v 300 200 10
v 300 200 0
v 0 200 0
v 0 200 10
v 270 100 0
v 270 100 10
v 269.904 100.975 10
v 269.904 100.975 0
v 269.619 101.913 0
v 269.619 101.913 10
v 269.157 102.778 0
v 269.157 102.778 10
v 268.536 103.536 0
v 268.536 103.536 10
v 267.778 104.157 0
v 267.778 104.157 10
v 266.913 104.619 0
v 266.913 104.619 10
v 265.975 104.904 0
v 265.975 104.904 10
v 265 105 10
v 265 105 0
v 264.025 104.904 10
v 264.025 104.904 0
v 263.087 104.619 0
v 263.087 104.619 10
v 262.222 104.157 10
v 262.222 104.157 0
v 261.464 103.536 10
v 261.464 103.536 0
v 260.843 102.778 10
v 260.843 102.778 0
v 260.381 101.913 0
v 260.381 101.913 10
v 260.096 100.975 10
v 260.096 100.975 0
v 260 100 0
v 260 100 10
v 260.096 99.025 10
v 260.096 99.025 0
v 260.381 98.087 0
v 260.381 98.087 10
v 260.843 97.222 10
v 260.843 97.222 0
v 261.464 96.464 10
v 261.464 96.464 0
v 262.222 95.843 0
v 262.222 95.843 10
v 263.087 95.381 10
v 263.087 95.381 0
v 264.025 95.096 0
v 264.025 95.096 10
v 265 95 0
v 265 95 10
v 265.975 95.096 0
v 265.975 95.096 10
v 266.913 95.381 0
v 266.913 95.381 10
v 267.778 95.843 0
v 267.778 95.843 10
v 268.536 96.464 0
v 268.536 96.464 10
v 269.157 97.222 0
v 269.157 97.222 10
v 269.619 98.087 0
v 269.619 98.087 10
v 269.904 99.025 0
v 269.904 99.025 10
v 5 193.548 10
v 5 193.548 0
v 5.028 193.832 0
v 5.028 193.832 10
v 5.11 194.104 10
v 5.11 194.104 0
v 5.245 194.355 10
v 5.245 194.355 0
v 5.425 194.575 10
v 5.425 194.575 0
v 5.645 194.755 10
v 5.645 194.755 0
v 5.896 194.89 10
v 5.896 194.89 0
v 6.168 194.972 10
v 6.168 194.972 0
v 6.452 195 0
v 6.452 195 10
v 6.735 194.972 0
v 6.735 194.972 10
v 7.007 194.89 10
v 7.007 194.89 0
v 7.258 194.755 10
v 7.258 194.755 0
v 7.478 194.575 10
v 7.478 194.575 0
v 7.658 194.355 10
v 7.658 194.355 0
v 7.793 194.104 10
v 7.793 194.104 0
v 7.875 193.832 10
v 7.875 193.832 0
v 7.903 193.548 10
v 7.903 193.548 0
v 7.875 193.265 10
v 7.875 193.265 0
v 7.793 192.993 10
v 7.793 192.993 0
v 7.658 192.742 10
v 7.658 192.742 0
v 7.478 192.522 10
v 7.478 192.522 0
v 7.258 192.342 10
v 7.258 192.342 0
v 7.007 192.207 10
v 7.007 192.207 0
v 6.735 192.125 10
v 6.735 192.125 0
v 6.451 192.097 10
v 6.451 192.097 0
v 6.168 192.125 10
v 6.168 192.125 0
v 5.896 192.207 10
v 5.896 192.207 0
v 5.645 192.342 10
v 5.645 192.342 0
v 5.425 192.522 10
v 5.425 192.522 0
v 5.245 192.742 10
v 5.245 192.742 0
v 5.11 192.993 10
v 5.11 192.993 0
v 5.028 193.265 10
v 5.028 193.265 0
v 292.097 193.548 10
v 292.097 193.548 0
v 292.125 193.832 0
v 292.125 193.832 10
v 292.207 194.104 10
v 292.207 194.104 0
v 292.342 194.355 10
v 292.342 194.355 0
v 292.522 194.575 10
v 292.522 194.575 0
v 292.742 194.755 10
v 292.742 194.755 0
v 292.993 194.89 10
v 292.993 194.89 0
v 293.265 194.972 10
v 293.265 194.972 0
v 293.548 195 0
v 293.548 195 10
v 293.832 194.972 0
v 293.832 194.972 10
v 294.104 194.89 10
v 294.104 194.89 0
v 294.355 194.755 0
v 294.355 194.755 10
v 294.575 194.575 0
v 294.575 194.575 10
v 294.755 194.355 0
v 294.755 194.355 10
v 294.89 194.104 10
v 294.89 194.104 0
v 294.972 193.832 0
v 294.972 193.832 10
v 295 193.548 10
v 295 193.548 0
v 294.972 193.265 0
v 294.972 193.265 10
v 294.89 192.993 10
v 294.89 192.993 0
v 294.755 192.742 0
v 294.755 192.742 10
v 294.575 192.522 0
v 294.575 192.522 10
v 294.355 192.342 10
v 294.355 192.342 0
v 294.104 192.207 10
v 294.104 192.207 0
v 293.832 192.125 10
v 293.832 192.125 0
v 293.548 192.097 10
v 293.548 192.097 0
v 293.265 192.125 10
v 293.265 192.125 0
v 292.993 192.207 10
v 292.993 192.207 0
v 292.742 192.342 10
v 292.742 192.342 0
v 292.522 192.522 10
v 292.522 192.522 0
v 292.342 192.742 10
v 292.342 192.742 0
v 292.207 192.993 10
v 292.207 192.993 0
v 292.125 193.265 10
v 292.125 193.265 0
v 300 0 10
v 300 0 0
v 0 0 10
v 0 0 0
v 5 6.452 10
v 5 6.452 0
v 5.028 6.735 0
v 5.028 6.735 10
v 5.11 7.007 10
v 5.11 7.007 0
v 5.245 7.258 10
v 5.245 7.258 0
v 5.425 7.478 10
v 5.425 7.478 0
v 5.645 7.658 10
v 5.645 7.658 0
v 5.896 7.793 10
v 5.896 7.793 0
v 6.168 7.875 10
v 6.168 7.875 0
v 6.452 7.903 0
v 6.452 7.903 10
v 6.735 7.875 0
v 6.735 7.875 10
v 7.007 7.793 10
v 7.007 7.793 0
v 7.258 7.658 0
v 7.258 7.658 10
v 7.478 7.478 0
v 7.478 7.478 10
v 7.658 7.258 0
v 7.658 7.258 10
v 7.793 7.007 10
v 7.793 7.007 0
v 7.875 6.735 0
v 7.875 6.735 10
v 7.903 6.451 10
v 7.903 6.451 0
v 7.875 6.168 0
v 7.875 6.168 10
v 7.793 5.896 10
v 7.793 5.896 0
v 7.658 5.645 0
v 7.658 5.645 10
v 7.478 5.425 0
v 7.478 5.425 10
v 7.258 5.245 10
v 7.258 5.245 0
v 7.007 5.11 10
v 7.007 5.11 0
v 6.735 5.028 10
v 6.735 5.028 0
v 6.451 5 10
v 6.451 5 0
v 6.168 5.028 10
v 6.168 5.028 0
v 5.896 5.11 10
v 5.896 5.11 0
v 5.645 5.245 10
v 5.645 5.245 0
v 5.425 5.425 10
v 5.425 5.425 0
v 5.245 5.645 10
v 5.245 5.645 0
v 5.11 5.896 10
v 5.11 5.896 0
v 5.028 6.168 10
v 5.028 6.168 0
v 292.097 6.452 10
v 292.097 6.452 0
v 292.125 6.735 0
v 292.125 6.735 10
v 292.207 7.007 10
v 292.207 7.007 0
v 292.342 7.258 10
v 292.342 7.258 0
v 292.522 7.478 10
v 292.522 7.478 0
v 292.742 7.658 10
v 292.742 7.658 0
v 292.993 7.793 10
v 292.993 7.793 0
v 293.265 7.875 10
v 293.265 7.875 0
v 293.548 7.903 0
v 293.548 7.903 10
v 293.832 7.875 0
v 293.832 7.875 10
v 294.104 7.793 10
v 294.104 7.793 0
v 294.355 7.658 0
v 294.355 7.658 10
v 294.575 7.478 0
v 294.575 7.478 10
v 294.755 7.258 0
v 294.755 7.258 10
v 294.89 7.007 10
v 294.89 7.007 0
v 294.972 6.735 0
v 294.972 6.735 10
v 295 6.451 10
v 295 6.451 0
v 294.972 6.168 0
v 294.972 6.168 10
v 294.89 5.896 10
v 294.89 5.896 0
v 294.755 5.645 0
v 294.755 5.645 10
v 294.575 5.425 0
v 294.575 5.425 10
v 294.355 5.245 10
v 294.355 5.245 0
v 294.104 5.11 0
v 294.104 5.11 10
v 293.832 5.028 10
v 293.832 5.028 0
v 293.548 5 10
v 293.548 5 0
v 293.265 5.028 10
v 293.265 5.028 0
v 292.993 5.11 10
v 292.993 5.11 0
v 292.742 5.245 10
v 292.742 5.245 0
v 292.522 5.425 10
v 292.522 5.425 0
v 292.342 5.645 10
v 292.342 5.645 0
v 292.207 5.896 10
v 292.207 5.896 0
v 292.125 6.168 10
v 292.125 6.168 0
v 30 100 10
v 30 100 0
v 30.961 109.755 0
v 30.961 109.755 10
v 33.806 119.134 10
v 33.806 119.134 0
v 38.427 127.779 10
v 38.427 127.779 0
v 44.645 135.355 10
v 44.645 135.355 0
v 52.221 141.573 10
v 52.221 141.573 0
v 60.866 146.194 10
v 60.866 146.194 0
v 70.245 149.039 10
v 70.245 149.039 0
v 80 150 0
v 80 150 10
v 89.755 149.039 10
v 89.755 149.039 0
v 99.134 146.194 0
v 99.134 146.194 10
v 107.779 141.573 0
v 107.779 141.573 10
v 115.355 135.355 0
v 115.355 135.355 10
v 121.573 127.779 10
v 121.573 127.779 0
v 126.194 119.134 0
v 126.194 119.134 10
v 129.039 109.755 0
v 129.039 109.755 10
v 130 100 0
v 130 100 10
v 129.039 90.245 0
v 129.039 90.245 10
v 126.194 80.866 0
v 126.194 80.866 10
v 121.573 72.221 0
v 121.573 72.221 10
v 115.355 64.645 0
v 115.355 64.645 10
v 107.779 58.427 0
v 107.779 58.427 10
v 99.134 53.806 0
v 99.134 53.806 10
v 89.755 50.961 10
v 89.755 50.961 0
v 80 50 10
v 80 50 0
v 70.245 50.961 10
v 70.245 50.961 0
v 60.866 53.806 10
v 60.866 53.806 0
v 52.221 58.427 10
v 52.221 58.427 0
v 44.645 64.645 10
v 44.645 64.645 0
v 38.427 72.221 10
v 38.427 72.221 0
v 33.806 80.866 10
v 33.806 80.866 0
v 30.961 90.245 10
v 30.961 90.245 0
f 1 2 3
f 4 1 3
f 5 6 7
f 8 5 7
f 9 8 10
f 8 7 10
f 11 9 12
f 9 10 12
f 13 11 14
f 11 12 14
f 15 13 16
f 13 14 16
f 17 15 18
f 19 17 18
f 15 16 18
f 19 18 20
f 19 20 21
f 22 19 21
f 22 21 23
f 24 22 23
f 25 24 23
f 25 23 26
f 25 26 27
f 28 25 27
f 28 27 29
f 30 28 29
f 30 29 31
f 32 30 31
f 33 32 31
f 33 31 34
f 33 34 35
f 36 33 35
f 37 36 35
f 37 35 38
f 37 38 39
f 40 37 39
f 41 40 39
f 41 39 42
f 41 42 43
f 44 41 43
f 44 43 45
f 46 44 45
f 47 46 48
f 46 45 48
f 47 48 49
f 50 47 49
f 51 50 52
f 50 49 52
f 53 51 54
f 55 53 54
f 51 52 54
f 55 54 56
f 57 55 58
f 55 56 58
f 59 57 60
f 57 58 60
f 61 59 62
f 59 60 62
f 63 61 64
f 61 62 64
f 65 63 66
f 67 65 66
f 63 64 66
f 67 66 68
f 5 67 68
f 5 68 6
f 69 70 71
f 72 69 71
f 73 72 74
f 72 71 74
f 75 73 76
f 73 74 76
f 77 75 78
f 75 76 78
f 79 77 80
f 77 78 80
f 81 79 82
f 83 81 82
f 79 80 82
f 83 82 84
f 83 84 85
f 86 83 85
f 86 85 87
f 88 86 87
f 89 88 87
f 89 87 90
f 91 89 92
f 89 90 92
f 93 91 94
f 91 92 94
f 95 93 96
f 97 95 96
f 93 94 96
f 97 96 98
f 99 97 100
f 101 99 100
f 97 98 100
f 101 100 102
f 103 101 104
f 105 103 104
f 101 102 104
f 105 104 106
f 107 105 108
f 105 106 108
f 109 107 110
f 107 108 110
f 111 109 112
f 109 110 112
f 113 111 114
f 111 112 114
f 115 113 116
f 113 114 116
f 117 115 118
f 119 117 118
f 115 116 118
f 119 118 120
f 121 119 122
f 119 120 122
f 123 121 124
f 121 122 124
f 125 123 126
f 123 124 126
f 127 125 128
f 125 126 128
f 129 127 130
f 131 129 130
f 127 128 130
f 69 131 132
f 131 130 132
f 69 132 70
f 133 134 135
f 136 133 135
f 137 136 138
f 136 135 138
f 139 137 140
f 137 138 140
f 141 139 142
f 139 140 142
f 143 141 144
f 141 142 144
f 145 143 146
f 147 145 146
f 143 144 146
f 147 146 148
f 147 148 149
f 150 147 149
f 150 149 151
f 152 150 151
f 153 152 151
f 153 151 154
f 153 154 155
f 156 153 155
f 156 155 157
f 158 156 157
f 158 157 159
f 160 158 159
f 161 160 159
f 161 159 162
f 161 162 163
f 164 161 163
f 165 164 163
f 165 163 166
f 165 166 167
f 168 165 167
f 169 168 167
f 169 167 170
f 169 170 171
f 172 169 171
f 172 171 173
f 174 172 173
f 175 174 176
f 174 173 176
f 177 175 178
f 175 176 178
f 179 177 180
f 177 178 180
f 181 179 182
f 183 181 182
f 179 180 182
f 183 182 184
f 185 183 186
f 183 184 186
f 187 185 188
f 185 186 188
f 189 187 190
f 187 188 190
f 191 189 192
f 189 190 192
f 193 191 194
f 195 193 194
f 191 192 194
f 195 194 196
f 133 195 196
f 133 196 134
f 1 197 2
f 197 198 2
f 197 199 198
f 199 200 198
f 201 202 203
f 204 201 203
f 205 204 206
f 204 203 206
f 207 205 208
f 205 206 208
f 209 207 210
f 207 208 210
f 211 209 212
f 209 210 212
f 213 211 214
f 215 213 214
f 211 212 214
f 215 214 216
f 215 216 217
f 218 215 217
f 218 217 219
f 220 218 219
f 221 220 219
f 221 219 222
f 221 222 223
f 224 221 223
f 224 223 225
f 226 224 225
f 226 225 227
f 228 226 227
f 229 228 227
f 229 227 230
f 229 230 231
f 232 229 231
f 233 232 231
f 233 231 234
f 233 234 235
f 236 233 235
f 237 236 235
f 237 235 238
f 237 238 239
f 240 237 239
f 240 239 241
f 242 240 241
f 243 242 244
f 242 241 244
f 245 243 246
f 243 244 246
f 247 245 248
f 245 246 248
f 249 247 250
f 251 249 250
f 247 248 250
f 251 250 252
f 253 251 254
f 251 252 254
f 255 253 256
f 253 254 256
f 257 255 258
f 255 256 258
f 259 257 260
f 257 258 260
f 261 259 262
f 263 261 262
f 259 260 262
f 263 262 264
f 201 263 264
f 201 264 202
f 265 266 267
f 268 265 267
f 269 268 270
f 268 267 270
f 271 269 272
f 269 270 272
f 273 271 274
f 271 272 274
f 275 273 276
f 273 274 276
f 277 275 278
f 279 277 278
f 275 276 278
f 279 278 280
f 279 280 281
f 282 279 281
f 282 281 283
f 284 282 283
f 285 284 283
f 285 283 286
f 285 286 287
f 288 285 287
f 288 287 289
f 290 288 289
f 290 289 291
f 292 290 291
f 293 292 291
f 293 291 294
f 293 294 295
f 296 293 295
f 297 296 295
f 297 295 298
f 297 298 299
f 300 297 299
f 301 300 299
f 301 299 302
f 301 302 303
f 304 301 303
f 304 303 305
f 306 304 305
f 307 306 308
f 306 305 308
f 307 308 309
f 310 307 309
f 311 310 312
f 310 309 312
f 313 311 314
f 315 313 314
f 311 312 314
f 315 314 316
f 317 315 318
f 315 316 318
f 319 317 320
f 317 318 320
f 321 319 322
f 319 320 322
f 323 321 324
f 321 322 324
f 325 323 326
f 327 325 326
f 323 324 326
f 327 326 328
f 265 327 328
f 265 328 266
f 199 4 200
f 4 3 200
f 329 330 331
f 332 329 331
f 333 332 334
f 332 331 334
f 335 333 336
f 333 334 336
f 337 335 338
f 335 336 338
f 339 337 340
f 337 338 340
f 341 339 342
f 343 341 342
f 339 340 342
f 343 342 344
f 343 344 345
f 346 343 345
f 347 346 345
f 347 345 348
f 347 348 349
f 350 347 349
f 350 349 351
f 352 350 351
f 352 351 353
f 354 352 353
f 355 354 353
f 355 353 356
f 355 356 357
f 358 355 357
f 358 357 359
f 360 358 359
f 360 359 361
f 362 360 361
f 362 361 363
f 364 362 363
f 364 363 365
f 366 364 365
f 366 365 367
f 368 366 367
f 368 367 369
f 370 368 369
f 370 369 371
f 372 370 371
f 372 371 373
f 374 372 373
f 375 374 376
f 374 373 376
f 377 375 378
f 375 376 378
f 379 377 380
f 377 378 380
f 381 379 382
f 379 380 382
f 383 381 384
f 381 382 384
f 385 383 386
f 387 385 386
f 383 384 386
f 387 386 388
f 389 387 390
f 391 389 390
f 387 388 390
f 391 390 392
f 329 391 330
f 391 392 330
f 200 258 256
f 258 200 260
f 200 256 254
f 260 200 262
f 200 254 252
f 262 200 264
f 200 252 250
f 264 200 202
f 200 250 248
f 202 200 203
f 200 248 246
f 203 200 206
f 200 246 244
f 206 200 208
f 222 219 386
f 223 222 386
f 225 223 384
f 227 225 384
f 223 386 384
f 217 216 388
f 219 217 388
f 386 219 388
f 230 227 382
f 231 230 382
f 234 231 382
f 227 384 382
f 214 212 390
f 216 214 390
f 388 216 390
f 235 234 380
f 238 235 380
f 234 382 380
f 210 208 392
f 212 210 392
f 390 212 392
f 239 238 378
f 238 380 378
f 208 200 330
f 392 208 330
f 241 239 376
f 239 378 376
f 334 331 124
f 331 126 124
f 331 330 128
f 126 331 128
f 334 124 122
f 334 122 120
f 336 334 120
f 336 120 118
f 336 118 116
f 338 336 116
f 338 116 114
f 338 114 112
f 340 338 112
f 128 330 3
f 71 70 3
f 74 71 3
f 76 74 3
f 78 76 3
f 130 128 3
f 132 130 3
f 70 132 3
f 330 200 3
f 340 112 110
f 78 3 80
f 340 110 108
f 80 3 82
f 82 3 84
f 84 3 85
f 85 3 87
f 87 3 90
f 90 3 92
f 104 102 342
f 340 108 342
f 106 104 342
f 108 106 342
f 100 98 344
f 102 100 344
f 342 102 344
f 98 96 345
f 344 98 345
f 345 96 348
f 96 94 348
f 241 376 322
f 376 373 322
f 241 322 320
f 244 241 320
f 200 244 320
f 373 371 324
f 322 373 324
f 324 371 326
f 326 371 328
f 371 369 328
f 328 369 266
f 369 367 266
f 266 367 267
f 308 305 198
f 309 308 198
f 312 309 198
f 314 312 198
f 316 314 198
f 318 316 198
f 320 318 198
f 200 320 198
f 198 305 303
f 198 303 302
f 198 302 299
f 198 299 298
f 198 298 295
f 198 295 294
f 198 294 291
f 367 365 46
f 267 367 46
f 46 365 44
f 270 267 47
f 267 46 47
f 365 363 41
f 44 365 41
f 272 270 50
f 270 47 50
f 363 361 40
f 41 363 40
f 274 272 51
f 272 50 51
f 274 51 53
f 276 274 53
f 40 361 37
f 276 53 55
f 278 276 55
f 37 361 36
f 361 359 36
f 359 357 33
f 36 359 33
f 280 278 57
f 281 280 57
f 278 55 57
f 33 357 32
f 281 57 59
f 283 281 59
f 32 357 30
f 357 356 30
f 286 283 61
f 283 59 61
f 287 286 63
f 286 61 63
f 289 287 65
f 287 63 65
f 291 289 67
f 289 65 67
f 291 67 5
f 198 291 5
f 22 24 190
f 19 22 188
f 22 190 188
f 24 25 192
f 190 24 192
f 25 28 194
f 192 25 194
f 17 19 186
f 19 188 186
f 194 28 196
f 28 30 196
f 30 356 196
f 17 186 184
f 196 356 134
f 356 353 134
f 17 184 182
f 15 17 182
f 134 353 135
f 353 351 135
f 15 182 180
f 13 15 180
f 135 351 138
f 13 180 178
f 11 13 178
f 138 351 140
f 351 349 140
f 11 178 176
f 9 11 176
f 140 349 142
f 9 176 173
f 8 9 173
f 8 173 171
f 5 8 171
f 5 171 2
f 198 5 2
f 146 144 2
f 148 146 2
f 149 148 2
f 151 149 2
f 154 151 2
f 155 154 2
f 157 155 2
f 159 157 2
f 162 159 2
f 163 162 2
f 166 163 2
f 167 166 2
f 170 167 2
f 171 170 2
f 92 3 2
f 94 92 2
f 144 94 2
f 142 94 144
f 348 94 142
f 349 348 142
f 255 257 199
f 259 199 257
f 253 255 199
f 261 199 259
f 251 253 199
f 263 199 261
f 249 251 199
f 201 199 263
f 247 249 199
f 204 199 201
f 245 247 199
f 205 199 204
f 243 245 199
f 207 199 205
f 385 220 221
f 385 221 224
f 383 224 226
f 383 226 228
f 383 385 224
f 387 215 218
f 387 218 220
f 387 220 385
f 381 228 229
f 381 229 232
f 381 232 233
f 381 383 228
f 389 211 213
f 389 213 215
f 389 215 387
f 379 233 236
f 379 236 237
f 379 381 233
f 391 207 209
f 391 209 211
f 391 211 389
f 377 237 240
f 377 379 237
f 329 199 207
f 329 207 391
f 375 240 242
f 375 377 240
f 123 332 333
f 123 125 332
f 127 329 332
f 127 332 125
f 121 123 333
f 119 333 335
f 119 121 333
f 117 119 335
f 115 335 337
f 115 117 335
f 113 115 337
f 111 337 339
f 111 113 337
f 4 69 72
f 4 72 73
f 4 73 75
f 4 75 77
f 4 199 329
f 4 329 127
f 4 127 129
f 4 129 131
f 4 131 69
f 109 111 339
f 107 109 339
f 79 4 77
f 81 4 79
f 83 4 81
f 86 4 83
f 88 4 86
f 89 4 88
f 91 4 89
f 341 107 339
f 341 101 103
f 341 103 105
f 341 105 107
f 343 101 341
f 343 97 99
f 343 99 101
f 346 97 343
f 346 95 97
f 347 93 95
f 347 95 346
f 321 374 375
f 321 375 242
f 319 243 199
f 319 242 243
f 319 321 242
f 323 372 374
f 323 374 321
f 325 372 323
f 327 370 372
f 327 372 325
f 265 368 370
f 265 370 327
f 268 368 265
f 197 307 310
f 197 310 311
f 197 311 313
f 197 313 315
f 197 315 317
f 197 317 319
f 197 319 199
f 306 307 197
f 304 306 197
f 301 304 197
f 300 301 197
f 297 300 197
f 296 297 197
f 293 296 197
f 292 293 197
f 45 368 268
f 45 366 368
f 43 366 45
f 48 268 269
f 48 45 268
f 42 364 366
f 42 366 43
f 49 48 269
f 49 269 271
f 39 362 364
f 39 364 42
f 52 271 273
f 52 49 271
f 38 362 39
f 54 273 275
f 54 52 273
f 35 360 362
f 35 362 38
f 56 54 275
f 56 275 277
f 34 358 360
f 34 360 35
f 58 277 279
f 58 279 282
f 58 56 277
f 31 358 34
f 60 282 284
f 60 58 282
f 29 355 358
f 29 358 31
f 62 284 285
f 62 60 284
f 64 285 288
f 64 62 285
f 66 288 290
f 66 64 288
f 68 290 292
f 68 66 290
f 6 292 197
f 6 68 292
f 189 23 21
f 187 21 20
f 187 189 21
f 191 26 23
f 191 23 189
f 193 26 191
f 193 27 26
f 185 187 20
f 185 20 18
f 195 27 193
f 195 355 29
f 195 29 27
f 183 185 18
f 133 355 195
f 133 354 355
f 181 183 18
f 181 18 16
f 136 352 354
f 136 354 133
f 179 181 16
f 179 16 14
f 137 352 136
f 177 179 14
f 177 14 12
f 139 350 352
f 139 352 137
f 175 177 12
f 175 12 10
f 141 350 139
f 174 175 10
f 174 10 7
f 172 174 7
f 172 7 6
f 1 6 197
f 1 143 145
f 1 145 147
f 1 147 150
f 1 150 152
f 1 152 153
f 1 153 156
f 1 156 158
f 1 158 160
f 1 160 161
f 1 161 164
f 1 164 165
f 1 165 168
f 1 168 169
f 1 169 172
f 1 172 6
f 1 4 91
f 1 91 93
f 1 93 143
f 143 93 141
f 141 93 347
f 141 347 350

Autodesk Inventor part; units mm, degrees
ref_plane "YZ Plane" through (0, 0, 0) normal (1, 0, 0) x (0, 1, 0)
ref_plane "XZ Plane" through (0, 0, 0) normal (0, 1, 0) x (-1, 0, 0)
ref_plane "XY Plane" through (0, 0, 0) normal (0, 0, 1) x (1, 0, 0)
sketch "Sketch1" plane through (0, 0, 0) normal (0, 0, 1) x (1, 0, 0)
  line L0 (0, 0) -> (300, 0)
  line L1 (300, 0) -> (300, 200)
  line L2 (300, 200) -> (0, 200)
  line L3 (0, 200) -> (0, 0)
  dimension "d0" = 300
  dimension "d1" = 200
extrude "Extrusion1" add sketch "Sketch1" along normal blind 10
sketch "Sketch2" plane through (0, 0, 0) normal (0, 0, -1) x (-1, 0, 0)
  circle A0 centre (-80, 100) radius 50
  line L0 (-300, 200) -> (0, 200) projected
  line L1 (0, 200) -> (0, 0) projected
  dimension "d4" = 100
  dimension "d5" = 100
  dimension "d6" = 80
extrude "Extrusion2" cut sketch "Sketch2" against normal through all
sketch "Sketch3" plane through (0, 0, 10) normal (0, 0, 1) x (1, 0, 0)
  point P0 (0, 0)
sketch "Sketch4" plane through (0, 0, 10) normal (0, 0, 1) x (1, 0, 0)
  circle A0 centre (265, 100) radius 5
  line L0 (0, 0) -> (300, 0) projected
  line L1 (300, 0) -> (300, 200) projected
  dimension "d9" = 10
  dimension "d10" = 100
  dimension "d11" = 30
extrude "Extrusion3" cut sketch "Sketch4" against normal through all
sketch "Sketch5" plane through (0, 0, 0) normal (0, 0, -1) x (-1, 0, 0)
  circle A0 centre (-6.4515, 6.4515) radius 1.4515
  circle A1 centre (-293.5485, 193.5485) radius 1.4515
  circle A2 centre (-293.5485, 6.4515) radius 1.4515
  line L0 (0, 200) -> (0, 0) projected
  line L1 (0, 0) -> (-300, 0) projected
  circle A3 centre (-6.4515, 193.5485) radius 1.4515
  line L2 (-300, 200) -> (0, 200) projected
  line L3 (-300, 0) -> (-300, 200) projected
  dimension "d14" = 2.903
  dimension "d16" = 2.903
  dimension "d17" = 2.903
  dimension "d18" = 5
  dimension "d19" = 5
  dimension "d20" = 2.903
  dimension "d21" = 5
  dimension "d22" = 5
  dimension "d23" = 5
  dimension "d24" = 5
  dimension "d25" = 5
  dimension "d26" = 5
extrude "Extrusion4" cut sketch "Sketch5" against normal through all contours A0 | A1 | A2 | A3
equation "\"BendRadius\" = Thickness"
equation "\"BendReliefWidth\" = Thickness"
equation "\"BendReliefDepth\" = 0.5 * Thickness"
equation "\"CornerReliefSize\" = 4 * Thickness"
equation "\"MinimumRemnant\" = 2 * Thickness"
equation "\"TransitionRadius\" = BendRadius"
equation "\"JacobiRadiusSize\" = BendRadius"
equation "\"GapSize\" = Thickness"
equation "\"Thickness\" = 0.5"
properties part number "base cap"
